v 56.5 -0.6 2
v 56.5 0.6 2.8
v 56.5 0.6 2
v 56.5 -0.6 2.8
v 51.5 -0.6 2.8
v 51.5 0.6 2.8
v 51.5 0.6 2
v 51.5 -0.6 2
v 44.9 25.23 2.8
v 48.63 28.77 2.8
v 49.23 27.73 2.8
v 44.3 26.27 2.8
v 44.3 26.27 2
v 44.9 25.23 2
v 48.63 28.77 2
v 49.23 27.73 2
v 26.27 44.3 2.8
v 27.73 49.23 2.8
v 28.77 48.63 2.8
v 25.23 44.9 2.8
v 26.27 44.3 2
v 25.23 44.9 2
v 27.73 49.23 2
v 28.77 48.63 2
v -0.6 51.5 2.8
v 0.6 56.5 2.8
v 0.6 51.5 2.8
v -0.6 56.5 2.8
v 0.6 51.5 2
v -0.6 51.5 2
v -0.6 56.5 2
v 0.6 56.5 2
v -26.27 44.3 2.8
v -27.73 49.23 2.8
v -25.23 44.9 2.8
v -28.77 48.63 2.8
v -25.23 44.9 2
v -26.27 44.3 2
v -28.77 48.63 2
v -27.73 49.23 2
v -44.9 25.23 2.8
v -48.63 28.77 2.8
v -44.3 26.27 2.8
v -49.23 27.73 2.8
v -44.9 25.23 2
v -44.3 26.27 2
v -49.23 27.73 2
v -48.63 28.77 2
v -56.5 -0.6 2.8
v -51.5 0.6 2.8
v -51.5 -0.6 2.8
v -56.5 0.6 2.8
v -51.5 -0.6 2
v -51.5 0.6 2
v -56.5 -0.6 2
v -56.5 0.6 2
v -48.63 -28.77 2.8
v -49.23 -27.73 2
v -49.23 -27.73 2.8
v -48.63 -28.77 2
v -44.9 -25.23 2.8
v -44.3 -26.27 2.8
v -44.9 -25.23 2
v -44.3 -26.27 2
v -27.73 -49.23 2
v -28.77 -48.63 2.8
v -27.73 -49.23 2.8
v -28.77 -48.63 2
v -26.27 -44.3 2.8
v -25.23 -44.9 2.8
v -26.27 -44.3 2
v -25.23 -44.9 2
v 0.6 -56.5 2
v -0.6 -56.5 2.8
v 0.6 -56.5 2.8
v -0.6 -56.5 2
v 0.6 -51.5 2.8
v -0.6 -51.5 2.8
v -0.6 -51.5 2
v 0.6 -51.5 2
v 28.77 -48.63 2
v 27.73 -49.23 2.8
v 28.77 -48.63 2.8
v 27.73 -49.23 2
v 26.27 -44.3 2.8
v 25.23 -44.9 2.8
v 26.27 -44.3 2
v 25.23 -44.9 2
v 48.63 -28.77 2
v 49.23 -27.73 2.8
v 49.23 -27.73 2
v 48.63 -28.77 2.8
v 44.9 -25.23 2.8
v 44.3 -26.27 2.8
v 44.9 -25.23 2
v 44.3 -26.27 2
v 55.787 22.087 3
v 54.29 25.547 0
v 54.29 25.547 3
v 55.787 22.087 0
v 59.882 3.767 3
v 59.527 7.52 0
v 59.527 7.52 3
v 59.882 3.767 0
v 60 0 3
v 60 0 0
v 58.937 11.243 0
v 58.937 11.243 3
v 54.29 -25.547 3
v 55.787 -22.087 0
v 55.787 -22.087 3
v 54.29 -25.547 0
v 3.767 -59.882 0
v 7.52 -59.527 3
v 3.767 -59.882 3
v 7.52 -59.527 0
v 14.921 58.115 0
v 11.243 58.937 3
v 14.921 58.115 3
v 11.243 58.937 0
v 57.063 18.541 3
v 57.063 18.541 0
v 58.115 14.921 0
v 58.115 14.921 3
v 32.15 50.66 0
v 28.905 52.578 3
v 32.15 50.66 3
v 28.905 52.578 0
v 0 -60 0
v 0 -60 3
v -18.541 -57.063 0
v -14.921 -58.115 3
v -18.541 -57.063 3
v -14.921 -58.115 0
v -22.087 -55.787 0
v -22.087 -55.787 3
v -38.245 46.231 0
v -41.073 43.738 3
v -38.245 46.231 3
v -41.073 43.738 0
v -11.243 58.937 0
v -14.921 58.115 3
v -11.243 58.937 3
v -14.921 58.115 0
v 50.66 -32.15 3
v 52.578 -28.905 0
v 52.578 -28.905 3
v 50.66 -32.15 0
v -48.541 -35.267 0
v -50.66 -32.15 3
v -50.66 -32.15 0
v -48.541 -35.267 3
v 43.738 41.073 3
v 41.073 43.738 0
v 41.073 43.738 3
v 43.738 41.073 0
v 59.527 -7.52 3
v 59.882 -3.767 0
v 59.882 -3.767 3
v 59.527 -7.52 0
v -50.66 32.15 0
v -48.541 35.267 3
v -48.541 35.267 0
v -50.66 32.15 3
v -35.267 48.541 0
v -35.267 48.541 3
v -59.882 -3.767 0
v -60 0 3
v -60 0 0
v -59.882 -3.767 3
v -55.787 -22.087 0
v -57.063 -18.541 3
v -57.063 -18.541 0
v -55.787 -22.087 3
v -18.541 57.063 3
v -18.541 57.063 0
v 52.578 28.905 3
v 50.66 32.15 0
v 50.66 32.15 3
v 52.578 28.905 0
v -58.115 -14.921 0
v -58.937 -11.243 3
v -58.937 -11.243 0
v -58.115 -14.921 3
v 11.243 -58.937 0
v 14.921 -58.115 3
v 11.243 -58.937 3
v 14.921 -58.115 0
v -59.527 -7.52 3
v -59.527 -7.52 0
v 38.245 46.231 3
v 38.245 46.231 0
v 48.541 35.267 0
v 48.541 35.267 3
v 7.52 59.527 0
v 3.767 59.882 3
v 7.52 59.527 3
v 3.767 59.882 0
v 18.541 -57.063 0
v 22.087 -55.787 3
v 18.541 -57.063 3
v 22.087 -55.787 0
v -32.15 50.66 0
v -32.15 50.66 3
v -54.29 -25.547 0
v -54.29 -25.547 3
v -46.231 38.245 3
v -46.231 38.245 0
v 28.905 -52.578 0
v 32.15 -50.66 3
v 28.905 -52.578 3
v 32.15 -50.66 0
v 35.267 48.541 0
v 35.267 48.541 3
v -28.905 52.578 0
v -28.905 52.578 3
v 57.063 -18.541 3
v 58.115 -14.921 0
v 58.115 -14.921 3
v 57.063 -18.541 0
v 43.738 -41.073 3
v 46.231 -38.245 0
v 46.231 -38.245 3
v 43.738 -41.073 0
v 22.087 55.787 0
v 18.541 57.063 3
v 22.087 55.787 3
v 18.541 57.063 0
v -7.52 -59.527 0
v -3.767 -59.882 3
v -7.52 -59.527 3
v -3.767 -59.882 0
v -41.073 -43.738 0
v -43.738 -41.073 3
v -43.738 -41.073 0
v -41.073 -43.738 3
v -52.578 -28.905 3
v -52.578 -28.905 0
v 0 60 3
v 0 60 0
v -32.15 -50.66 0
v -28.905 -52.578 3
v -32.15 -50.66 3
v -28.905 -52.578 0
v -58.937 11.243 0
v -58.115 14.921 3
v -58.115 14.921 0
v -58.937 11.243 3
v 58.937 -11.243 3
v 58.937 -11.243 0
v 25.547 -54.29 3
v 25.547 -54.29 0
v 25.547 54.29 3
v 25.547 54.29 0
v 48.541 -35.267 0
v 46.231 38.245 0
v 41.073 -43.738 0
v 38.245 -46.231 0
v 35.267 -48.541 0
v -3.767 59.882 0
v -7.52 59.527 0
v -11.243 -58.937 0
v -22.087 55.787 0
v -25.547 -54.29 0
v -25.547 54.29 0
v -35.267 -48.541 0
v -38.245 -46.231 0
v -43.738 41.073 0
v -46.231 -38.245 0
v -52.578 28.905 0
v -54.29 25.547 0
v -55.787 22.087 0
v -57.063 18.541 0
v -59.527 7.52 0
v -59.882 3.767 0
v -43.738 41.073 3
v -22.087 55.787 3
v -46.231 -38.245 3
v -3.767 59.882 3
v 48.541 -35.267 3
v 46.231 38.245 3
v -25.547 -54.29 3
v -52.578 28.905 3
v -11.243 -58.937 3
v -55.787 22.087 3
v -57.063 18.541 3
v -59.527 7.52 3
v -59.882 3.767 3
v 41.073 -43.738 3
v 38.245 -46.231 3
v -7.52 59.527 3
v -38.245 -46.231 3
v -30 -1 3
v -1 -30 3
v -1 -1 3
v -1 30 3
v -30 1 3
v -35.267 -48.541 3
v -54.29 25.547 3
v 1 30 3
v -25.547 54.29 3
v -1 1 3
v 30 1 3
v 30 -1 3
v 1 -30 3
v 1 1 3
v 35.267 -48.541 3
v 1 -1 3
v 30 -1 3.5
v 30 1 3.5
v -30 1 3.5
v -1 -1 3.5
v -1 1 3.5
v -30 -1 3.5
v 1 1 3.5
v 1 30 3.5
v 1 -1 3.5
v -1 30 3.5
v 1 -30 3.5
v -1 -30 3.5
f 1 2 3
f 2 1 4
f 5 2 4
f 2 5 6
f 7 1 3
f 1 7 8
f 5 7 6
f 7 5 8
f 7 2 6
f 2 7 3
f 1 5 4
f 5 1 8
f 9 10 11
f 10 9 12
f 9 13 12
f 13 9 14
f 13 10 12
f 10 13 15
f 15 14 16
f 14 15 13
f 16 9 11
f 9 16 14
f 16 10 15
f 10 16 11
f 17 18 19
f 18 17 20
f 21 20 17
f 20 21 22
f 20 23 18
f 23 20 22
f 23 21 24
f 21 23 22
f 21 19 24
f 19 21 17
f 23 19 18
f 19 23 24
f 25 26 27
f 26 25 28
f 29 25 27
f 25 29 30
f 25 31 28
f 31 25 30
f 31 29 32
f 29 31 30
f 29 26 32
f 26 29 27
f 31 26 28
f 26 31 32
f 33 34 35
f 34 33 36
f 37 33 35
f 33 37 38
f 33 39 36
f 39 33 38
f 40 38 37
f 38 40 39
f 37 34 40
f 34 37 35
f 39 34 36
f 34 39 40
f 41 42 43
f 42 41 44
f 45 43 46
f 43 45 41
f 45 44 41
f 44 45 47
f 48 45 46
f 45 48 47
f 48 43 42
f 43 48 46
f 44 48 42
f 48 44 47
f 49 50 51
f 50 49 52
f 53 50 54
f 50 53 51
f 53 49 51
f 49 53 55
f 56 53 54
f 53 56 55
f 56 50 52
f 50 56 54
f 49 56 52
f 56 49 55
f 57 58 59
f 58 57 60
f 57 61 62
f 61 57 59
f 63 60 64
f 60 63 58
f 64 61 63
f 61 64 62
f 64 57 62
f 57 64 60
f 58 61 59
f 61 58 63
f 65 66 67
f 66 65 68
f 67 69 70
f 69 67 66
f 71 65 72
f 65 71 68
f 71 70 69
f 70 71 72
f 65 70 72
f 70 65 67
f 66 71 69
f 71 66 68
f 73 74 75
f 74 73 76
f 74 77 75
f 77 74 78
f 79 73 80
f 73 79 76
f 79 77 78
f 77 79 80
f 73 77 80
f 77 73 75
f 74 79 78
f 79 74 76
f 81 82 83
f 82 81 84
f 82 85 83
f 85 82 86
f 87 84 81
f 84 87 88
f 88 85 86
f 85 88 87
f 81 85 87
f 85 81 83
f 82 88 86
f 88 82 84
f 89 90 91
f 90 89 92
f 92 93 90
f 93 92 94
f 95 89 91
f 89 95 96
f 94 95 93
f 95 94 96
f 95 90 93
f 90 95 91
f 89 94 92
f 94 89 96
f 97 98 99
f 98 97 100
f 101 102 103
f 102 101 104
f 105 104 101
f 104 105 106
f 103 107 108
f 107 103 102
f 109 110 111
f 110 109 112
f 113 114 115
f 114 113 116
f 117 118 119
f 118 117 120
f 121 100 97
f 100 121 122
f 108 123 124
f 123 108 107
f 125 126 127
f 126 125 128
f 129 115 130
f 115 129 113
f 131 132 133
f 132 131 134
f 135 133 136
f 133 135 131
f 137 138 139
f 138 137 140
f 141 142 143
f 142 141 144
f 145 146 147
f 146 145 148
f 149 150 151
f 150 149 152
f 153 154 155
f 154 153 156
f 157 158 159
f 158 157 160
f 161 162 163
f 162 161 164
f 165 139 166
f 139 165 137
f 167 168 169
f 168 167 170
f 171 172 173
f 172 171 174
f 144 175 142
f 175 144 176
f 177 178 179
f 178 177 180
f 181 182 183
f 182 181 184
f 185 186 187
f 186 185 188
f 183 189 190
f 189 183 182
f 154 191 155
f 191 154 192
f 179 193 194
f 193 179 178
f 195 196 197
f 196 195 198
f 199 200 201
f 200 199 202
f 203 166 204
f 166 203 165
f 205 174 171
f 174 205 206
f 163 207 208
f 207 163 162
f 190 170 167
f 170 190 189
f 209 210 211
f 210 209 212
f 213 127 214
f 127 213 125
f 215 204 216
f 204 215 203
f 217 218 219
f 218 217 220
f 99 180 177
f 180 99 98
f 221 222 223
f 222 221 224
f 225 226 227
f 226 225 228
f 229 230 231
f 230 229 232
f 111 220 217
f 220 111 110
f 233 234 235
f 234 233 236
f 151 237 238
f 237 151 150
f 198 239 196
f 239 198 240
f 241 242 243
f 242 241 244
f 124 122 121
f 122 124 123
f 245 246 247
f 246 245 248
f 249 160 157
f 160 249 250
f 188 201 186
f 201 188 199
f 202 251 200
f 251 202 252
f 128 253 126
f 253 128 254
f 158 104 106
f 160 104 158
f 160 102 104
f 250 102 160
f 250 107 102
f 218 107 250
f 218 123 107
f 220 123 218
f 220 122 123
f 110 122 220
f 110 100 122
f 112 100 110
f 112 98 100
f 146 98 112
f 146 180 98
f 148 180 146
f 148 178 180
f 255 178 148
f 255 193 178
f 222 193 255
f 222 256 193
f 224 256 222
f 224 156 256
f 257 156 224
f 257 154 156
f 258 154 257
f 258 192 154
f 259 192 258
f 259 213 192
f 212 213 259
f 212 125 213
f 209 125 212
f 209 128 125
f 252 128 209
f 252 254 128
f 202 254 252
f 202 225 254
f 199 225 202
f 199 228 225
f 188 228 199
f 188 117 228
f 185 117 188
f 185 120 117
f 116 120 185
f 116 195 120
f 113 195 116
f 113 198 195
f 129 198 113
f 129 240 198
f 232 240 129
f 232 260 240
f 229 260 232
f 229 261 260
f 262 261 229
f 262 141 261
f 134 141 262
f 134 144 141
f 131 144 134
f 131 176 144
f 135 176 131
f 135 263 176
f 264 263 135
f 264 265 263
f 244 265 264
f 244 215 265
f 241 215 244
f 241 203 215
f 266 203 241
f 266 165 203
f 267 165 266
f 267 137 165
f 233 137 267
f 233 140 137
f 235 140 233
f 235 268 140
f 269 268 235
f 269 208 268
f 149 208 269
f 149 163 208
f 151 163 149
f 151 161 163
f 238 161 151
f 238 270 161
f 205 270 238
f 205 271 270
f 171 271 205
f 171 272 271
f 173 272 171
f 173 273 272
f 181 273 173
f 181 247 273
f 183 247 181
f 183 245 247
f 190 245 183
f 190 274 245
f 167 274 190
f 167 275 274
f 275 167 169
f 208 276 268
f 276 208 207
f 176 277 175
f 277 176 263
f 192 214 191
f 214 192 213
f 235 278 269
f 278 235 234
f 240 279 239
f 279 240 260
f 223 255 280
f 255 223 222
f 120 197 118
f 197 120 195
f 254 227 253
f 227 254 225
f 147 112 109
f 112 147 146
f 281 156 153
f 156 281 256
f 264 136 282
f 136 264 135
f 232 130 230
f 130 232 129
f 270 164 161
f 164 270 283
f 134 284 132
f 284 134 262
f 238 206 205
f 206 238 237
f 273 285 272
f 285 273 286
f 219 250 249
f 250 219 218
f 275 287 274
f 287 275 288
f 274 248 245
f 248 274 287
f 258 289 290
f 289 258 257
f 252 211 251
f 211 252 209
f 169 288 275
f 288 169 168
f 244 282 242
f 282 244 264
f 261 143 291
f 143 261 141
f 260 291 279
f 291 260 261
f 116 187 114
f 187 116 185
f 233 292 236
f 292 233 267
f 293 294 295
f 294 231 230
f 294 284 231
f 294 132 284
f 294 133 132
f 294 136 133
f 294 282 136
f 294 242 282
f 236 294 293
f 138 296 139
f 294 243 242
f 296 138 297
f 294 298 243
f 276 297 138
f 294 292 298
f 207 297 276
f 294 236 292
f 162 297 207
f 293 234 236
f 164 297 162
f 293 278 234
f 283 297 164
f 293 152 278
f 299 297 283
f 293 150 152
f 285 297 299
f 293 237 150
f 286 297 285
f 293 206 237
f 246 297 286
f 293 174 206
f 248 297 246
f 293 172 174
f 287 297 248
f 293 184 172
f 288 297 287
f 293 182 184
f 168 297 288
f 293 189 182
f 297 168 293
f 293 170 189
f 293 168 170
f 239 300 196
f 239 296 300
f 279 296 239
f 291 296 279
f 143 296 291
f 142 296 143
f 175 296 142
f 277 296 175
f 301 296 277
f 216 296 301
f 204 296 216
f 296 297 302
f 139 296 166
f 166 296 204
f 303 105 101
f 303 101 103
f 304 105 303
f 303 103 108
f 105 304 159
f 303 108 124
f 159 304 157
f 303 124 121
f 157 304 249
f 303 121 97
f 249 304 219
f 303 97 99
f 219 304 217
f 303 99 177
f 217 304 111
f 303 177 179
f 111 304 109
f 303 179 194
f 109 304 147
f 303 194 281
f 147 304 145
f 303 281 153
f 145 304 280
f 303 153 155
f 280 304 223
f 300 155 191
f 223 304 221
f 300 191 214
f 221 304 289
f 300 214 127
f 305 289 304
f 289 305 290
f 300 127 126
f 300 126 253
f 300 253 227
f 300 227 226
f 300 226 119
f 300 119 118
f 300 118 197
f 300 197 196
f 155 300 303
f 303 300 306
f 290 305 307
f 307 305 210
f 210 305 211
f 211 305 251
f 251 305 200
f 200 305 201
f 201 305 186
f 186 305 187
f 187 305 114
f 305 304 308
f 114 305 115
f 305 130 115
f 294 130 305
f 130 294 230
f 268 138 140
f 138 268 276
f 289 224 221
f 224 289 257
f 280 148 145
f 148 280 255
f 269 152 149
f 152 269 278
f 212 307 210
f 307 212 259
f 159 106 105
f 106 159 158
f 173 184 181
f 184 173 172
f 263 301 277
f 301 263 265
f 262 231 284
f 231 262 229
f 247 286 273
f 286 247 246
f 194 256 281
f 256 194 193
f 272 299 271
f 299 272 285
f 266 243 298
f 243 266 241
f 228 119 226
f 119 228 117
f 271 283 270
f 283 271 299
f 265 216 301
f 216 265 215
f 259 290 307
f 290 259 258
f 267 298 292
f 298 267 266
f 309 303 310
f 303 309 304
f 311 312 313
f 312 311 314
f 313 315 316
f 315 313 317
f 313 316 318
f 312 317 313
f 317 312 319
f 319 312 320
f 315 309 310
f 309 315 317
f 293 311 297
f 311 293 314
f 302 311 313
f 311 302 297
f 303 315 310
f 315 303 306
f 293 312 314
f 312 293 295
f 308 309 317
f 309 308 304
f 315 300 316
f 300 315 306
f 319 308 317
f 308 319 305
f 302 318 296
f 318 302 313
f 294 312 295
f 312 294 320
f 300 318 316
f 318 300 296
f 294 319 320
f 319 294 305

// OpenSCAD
/*
Title: SHM Displacement Phase Disk
Folder: 16_oscillations_shm
Physics Topic: Simple harmonic motion phase
Difficulty: Beginner-Intermediate
Print Type: FDM, single material
Teaches: Conceptual mechanics
Use Case: Classroom manipulative
*/


// --------------------
// Parameters
// --------------------
r = 60;
t = 3;

module phase_disk(){
    difference(){
        cylinder(h=t,r=r,$fn=100);
        for(a=[0:30:330]) rotate([0,0,a]) translate([r-6,0,t-0.6]) cube([5,1.2,0.8],center=true);
    }
    translate([0,0,t]) cube([r,2,1],center=true);
    translate([0,0,t]) cube([2,r,1],center=true);
}
phase_disk();
